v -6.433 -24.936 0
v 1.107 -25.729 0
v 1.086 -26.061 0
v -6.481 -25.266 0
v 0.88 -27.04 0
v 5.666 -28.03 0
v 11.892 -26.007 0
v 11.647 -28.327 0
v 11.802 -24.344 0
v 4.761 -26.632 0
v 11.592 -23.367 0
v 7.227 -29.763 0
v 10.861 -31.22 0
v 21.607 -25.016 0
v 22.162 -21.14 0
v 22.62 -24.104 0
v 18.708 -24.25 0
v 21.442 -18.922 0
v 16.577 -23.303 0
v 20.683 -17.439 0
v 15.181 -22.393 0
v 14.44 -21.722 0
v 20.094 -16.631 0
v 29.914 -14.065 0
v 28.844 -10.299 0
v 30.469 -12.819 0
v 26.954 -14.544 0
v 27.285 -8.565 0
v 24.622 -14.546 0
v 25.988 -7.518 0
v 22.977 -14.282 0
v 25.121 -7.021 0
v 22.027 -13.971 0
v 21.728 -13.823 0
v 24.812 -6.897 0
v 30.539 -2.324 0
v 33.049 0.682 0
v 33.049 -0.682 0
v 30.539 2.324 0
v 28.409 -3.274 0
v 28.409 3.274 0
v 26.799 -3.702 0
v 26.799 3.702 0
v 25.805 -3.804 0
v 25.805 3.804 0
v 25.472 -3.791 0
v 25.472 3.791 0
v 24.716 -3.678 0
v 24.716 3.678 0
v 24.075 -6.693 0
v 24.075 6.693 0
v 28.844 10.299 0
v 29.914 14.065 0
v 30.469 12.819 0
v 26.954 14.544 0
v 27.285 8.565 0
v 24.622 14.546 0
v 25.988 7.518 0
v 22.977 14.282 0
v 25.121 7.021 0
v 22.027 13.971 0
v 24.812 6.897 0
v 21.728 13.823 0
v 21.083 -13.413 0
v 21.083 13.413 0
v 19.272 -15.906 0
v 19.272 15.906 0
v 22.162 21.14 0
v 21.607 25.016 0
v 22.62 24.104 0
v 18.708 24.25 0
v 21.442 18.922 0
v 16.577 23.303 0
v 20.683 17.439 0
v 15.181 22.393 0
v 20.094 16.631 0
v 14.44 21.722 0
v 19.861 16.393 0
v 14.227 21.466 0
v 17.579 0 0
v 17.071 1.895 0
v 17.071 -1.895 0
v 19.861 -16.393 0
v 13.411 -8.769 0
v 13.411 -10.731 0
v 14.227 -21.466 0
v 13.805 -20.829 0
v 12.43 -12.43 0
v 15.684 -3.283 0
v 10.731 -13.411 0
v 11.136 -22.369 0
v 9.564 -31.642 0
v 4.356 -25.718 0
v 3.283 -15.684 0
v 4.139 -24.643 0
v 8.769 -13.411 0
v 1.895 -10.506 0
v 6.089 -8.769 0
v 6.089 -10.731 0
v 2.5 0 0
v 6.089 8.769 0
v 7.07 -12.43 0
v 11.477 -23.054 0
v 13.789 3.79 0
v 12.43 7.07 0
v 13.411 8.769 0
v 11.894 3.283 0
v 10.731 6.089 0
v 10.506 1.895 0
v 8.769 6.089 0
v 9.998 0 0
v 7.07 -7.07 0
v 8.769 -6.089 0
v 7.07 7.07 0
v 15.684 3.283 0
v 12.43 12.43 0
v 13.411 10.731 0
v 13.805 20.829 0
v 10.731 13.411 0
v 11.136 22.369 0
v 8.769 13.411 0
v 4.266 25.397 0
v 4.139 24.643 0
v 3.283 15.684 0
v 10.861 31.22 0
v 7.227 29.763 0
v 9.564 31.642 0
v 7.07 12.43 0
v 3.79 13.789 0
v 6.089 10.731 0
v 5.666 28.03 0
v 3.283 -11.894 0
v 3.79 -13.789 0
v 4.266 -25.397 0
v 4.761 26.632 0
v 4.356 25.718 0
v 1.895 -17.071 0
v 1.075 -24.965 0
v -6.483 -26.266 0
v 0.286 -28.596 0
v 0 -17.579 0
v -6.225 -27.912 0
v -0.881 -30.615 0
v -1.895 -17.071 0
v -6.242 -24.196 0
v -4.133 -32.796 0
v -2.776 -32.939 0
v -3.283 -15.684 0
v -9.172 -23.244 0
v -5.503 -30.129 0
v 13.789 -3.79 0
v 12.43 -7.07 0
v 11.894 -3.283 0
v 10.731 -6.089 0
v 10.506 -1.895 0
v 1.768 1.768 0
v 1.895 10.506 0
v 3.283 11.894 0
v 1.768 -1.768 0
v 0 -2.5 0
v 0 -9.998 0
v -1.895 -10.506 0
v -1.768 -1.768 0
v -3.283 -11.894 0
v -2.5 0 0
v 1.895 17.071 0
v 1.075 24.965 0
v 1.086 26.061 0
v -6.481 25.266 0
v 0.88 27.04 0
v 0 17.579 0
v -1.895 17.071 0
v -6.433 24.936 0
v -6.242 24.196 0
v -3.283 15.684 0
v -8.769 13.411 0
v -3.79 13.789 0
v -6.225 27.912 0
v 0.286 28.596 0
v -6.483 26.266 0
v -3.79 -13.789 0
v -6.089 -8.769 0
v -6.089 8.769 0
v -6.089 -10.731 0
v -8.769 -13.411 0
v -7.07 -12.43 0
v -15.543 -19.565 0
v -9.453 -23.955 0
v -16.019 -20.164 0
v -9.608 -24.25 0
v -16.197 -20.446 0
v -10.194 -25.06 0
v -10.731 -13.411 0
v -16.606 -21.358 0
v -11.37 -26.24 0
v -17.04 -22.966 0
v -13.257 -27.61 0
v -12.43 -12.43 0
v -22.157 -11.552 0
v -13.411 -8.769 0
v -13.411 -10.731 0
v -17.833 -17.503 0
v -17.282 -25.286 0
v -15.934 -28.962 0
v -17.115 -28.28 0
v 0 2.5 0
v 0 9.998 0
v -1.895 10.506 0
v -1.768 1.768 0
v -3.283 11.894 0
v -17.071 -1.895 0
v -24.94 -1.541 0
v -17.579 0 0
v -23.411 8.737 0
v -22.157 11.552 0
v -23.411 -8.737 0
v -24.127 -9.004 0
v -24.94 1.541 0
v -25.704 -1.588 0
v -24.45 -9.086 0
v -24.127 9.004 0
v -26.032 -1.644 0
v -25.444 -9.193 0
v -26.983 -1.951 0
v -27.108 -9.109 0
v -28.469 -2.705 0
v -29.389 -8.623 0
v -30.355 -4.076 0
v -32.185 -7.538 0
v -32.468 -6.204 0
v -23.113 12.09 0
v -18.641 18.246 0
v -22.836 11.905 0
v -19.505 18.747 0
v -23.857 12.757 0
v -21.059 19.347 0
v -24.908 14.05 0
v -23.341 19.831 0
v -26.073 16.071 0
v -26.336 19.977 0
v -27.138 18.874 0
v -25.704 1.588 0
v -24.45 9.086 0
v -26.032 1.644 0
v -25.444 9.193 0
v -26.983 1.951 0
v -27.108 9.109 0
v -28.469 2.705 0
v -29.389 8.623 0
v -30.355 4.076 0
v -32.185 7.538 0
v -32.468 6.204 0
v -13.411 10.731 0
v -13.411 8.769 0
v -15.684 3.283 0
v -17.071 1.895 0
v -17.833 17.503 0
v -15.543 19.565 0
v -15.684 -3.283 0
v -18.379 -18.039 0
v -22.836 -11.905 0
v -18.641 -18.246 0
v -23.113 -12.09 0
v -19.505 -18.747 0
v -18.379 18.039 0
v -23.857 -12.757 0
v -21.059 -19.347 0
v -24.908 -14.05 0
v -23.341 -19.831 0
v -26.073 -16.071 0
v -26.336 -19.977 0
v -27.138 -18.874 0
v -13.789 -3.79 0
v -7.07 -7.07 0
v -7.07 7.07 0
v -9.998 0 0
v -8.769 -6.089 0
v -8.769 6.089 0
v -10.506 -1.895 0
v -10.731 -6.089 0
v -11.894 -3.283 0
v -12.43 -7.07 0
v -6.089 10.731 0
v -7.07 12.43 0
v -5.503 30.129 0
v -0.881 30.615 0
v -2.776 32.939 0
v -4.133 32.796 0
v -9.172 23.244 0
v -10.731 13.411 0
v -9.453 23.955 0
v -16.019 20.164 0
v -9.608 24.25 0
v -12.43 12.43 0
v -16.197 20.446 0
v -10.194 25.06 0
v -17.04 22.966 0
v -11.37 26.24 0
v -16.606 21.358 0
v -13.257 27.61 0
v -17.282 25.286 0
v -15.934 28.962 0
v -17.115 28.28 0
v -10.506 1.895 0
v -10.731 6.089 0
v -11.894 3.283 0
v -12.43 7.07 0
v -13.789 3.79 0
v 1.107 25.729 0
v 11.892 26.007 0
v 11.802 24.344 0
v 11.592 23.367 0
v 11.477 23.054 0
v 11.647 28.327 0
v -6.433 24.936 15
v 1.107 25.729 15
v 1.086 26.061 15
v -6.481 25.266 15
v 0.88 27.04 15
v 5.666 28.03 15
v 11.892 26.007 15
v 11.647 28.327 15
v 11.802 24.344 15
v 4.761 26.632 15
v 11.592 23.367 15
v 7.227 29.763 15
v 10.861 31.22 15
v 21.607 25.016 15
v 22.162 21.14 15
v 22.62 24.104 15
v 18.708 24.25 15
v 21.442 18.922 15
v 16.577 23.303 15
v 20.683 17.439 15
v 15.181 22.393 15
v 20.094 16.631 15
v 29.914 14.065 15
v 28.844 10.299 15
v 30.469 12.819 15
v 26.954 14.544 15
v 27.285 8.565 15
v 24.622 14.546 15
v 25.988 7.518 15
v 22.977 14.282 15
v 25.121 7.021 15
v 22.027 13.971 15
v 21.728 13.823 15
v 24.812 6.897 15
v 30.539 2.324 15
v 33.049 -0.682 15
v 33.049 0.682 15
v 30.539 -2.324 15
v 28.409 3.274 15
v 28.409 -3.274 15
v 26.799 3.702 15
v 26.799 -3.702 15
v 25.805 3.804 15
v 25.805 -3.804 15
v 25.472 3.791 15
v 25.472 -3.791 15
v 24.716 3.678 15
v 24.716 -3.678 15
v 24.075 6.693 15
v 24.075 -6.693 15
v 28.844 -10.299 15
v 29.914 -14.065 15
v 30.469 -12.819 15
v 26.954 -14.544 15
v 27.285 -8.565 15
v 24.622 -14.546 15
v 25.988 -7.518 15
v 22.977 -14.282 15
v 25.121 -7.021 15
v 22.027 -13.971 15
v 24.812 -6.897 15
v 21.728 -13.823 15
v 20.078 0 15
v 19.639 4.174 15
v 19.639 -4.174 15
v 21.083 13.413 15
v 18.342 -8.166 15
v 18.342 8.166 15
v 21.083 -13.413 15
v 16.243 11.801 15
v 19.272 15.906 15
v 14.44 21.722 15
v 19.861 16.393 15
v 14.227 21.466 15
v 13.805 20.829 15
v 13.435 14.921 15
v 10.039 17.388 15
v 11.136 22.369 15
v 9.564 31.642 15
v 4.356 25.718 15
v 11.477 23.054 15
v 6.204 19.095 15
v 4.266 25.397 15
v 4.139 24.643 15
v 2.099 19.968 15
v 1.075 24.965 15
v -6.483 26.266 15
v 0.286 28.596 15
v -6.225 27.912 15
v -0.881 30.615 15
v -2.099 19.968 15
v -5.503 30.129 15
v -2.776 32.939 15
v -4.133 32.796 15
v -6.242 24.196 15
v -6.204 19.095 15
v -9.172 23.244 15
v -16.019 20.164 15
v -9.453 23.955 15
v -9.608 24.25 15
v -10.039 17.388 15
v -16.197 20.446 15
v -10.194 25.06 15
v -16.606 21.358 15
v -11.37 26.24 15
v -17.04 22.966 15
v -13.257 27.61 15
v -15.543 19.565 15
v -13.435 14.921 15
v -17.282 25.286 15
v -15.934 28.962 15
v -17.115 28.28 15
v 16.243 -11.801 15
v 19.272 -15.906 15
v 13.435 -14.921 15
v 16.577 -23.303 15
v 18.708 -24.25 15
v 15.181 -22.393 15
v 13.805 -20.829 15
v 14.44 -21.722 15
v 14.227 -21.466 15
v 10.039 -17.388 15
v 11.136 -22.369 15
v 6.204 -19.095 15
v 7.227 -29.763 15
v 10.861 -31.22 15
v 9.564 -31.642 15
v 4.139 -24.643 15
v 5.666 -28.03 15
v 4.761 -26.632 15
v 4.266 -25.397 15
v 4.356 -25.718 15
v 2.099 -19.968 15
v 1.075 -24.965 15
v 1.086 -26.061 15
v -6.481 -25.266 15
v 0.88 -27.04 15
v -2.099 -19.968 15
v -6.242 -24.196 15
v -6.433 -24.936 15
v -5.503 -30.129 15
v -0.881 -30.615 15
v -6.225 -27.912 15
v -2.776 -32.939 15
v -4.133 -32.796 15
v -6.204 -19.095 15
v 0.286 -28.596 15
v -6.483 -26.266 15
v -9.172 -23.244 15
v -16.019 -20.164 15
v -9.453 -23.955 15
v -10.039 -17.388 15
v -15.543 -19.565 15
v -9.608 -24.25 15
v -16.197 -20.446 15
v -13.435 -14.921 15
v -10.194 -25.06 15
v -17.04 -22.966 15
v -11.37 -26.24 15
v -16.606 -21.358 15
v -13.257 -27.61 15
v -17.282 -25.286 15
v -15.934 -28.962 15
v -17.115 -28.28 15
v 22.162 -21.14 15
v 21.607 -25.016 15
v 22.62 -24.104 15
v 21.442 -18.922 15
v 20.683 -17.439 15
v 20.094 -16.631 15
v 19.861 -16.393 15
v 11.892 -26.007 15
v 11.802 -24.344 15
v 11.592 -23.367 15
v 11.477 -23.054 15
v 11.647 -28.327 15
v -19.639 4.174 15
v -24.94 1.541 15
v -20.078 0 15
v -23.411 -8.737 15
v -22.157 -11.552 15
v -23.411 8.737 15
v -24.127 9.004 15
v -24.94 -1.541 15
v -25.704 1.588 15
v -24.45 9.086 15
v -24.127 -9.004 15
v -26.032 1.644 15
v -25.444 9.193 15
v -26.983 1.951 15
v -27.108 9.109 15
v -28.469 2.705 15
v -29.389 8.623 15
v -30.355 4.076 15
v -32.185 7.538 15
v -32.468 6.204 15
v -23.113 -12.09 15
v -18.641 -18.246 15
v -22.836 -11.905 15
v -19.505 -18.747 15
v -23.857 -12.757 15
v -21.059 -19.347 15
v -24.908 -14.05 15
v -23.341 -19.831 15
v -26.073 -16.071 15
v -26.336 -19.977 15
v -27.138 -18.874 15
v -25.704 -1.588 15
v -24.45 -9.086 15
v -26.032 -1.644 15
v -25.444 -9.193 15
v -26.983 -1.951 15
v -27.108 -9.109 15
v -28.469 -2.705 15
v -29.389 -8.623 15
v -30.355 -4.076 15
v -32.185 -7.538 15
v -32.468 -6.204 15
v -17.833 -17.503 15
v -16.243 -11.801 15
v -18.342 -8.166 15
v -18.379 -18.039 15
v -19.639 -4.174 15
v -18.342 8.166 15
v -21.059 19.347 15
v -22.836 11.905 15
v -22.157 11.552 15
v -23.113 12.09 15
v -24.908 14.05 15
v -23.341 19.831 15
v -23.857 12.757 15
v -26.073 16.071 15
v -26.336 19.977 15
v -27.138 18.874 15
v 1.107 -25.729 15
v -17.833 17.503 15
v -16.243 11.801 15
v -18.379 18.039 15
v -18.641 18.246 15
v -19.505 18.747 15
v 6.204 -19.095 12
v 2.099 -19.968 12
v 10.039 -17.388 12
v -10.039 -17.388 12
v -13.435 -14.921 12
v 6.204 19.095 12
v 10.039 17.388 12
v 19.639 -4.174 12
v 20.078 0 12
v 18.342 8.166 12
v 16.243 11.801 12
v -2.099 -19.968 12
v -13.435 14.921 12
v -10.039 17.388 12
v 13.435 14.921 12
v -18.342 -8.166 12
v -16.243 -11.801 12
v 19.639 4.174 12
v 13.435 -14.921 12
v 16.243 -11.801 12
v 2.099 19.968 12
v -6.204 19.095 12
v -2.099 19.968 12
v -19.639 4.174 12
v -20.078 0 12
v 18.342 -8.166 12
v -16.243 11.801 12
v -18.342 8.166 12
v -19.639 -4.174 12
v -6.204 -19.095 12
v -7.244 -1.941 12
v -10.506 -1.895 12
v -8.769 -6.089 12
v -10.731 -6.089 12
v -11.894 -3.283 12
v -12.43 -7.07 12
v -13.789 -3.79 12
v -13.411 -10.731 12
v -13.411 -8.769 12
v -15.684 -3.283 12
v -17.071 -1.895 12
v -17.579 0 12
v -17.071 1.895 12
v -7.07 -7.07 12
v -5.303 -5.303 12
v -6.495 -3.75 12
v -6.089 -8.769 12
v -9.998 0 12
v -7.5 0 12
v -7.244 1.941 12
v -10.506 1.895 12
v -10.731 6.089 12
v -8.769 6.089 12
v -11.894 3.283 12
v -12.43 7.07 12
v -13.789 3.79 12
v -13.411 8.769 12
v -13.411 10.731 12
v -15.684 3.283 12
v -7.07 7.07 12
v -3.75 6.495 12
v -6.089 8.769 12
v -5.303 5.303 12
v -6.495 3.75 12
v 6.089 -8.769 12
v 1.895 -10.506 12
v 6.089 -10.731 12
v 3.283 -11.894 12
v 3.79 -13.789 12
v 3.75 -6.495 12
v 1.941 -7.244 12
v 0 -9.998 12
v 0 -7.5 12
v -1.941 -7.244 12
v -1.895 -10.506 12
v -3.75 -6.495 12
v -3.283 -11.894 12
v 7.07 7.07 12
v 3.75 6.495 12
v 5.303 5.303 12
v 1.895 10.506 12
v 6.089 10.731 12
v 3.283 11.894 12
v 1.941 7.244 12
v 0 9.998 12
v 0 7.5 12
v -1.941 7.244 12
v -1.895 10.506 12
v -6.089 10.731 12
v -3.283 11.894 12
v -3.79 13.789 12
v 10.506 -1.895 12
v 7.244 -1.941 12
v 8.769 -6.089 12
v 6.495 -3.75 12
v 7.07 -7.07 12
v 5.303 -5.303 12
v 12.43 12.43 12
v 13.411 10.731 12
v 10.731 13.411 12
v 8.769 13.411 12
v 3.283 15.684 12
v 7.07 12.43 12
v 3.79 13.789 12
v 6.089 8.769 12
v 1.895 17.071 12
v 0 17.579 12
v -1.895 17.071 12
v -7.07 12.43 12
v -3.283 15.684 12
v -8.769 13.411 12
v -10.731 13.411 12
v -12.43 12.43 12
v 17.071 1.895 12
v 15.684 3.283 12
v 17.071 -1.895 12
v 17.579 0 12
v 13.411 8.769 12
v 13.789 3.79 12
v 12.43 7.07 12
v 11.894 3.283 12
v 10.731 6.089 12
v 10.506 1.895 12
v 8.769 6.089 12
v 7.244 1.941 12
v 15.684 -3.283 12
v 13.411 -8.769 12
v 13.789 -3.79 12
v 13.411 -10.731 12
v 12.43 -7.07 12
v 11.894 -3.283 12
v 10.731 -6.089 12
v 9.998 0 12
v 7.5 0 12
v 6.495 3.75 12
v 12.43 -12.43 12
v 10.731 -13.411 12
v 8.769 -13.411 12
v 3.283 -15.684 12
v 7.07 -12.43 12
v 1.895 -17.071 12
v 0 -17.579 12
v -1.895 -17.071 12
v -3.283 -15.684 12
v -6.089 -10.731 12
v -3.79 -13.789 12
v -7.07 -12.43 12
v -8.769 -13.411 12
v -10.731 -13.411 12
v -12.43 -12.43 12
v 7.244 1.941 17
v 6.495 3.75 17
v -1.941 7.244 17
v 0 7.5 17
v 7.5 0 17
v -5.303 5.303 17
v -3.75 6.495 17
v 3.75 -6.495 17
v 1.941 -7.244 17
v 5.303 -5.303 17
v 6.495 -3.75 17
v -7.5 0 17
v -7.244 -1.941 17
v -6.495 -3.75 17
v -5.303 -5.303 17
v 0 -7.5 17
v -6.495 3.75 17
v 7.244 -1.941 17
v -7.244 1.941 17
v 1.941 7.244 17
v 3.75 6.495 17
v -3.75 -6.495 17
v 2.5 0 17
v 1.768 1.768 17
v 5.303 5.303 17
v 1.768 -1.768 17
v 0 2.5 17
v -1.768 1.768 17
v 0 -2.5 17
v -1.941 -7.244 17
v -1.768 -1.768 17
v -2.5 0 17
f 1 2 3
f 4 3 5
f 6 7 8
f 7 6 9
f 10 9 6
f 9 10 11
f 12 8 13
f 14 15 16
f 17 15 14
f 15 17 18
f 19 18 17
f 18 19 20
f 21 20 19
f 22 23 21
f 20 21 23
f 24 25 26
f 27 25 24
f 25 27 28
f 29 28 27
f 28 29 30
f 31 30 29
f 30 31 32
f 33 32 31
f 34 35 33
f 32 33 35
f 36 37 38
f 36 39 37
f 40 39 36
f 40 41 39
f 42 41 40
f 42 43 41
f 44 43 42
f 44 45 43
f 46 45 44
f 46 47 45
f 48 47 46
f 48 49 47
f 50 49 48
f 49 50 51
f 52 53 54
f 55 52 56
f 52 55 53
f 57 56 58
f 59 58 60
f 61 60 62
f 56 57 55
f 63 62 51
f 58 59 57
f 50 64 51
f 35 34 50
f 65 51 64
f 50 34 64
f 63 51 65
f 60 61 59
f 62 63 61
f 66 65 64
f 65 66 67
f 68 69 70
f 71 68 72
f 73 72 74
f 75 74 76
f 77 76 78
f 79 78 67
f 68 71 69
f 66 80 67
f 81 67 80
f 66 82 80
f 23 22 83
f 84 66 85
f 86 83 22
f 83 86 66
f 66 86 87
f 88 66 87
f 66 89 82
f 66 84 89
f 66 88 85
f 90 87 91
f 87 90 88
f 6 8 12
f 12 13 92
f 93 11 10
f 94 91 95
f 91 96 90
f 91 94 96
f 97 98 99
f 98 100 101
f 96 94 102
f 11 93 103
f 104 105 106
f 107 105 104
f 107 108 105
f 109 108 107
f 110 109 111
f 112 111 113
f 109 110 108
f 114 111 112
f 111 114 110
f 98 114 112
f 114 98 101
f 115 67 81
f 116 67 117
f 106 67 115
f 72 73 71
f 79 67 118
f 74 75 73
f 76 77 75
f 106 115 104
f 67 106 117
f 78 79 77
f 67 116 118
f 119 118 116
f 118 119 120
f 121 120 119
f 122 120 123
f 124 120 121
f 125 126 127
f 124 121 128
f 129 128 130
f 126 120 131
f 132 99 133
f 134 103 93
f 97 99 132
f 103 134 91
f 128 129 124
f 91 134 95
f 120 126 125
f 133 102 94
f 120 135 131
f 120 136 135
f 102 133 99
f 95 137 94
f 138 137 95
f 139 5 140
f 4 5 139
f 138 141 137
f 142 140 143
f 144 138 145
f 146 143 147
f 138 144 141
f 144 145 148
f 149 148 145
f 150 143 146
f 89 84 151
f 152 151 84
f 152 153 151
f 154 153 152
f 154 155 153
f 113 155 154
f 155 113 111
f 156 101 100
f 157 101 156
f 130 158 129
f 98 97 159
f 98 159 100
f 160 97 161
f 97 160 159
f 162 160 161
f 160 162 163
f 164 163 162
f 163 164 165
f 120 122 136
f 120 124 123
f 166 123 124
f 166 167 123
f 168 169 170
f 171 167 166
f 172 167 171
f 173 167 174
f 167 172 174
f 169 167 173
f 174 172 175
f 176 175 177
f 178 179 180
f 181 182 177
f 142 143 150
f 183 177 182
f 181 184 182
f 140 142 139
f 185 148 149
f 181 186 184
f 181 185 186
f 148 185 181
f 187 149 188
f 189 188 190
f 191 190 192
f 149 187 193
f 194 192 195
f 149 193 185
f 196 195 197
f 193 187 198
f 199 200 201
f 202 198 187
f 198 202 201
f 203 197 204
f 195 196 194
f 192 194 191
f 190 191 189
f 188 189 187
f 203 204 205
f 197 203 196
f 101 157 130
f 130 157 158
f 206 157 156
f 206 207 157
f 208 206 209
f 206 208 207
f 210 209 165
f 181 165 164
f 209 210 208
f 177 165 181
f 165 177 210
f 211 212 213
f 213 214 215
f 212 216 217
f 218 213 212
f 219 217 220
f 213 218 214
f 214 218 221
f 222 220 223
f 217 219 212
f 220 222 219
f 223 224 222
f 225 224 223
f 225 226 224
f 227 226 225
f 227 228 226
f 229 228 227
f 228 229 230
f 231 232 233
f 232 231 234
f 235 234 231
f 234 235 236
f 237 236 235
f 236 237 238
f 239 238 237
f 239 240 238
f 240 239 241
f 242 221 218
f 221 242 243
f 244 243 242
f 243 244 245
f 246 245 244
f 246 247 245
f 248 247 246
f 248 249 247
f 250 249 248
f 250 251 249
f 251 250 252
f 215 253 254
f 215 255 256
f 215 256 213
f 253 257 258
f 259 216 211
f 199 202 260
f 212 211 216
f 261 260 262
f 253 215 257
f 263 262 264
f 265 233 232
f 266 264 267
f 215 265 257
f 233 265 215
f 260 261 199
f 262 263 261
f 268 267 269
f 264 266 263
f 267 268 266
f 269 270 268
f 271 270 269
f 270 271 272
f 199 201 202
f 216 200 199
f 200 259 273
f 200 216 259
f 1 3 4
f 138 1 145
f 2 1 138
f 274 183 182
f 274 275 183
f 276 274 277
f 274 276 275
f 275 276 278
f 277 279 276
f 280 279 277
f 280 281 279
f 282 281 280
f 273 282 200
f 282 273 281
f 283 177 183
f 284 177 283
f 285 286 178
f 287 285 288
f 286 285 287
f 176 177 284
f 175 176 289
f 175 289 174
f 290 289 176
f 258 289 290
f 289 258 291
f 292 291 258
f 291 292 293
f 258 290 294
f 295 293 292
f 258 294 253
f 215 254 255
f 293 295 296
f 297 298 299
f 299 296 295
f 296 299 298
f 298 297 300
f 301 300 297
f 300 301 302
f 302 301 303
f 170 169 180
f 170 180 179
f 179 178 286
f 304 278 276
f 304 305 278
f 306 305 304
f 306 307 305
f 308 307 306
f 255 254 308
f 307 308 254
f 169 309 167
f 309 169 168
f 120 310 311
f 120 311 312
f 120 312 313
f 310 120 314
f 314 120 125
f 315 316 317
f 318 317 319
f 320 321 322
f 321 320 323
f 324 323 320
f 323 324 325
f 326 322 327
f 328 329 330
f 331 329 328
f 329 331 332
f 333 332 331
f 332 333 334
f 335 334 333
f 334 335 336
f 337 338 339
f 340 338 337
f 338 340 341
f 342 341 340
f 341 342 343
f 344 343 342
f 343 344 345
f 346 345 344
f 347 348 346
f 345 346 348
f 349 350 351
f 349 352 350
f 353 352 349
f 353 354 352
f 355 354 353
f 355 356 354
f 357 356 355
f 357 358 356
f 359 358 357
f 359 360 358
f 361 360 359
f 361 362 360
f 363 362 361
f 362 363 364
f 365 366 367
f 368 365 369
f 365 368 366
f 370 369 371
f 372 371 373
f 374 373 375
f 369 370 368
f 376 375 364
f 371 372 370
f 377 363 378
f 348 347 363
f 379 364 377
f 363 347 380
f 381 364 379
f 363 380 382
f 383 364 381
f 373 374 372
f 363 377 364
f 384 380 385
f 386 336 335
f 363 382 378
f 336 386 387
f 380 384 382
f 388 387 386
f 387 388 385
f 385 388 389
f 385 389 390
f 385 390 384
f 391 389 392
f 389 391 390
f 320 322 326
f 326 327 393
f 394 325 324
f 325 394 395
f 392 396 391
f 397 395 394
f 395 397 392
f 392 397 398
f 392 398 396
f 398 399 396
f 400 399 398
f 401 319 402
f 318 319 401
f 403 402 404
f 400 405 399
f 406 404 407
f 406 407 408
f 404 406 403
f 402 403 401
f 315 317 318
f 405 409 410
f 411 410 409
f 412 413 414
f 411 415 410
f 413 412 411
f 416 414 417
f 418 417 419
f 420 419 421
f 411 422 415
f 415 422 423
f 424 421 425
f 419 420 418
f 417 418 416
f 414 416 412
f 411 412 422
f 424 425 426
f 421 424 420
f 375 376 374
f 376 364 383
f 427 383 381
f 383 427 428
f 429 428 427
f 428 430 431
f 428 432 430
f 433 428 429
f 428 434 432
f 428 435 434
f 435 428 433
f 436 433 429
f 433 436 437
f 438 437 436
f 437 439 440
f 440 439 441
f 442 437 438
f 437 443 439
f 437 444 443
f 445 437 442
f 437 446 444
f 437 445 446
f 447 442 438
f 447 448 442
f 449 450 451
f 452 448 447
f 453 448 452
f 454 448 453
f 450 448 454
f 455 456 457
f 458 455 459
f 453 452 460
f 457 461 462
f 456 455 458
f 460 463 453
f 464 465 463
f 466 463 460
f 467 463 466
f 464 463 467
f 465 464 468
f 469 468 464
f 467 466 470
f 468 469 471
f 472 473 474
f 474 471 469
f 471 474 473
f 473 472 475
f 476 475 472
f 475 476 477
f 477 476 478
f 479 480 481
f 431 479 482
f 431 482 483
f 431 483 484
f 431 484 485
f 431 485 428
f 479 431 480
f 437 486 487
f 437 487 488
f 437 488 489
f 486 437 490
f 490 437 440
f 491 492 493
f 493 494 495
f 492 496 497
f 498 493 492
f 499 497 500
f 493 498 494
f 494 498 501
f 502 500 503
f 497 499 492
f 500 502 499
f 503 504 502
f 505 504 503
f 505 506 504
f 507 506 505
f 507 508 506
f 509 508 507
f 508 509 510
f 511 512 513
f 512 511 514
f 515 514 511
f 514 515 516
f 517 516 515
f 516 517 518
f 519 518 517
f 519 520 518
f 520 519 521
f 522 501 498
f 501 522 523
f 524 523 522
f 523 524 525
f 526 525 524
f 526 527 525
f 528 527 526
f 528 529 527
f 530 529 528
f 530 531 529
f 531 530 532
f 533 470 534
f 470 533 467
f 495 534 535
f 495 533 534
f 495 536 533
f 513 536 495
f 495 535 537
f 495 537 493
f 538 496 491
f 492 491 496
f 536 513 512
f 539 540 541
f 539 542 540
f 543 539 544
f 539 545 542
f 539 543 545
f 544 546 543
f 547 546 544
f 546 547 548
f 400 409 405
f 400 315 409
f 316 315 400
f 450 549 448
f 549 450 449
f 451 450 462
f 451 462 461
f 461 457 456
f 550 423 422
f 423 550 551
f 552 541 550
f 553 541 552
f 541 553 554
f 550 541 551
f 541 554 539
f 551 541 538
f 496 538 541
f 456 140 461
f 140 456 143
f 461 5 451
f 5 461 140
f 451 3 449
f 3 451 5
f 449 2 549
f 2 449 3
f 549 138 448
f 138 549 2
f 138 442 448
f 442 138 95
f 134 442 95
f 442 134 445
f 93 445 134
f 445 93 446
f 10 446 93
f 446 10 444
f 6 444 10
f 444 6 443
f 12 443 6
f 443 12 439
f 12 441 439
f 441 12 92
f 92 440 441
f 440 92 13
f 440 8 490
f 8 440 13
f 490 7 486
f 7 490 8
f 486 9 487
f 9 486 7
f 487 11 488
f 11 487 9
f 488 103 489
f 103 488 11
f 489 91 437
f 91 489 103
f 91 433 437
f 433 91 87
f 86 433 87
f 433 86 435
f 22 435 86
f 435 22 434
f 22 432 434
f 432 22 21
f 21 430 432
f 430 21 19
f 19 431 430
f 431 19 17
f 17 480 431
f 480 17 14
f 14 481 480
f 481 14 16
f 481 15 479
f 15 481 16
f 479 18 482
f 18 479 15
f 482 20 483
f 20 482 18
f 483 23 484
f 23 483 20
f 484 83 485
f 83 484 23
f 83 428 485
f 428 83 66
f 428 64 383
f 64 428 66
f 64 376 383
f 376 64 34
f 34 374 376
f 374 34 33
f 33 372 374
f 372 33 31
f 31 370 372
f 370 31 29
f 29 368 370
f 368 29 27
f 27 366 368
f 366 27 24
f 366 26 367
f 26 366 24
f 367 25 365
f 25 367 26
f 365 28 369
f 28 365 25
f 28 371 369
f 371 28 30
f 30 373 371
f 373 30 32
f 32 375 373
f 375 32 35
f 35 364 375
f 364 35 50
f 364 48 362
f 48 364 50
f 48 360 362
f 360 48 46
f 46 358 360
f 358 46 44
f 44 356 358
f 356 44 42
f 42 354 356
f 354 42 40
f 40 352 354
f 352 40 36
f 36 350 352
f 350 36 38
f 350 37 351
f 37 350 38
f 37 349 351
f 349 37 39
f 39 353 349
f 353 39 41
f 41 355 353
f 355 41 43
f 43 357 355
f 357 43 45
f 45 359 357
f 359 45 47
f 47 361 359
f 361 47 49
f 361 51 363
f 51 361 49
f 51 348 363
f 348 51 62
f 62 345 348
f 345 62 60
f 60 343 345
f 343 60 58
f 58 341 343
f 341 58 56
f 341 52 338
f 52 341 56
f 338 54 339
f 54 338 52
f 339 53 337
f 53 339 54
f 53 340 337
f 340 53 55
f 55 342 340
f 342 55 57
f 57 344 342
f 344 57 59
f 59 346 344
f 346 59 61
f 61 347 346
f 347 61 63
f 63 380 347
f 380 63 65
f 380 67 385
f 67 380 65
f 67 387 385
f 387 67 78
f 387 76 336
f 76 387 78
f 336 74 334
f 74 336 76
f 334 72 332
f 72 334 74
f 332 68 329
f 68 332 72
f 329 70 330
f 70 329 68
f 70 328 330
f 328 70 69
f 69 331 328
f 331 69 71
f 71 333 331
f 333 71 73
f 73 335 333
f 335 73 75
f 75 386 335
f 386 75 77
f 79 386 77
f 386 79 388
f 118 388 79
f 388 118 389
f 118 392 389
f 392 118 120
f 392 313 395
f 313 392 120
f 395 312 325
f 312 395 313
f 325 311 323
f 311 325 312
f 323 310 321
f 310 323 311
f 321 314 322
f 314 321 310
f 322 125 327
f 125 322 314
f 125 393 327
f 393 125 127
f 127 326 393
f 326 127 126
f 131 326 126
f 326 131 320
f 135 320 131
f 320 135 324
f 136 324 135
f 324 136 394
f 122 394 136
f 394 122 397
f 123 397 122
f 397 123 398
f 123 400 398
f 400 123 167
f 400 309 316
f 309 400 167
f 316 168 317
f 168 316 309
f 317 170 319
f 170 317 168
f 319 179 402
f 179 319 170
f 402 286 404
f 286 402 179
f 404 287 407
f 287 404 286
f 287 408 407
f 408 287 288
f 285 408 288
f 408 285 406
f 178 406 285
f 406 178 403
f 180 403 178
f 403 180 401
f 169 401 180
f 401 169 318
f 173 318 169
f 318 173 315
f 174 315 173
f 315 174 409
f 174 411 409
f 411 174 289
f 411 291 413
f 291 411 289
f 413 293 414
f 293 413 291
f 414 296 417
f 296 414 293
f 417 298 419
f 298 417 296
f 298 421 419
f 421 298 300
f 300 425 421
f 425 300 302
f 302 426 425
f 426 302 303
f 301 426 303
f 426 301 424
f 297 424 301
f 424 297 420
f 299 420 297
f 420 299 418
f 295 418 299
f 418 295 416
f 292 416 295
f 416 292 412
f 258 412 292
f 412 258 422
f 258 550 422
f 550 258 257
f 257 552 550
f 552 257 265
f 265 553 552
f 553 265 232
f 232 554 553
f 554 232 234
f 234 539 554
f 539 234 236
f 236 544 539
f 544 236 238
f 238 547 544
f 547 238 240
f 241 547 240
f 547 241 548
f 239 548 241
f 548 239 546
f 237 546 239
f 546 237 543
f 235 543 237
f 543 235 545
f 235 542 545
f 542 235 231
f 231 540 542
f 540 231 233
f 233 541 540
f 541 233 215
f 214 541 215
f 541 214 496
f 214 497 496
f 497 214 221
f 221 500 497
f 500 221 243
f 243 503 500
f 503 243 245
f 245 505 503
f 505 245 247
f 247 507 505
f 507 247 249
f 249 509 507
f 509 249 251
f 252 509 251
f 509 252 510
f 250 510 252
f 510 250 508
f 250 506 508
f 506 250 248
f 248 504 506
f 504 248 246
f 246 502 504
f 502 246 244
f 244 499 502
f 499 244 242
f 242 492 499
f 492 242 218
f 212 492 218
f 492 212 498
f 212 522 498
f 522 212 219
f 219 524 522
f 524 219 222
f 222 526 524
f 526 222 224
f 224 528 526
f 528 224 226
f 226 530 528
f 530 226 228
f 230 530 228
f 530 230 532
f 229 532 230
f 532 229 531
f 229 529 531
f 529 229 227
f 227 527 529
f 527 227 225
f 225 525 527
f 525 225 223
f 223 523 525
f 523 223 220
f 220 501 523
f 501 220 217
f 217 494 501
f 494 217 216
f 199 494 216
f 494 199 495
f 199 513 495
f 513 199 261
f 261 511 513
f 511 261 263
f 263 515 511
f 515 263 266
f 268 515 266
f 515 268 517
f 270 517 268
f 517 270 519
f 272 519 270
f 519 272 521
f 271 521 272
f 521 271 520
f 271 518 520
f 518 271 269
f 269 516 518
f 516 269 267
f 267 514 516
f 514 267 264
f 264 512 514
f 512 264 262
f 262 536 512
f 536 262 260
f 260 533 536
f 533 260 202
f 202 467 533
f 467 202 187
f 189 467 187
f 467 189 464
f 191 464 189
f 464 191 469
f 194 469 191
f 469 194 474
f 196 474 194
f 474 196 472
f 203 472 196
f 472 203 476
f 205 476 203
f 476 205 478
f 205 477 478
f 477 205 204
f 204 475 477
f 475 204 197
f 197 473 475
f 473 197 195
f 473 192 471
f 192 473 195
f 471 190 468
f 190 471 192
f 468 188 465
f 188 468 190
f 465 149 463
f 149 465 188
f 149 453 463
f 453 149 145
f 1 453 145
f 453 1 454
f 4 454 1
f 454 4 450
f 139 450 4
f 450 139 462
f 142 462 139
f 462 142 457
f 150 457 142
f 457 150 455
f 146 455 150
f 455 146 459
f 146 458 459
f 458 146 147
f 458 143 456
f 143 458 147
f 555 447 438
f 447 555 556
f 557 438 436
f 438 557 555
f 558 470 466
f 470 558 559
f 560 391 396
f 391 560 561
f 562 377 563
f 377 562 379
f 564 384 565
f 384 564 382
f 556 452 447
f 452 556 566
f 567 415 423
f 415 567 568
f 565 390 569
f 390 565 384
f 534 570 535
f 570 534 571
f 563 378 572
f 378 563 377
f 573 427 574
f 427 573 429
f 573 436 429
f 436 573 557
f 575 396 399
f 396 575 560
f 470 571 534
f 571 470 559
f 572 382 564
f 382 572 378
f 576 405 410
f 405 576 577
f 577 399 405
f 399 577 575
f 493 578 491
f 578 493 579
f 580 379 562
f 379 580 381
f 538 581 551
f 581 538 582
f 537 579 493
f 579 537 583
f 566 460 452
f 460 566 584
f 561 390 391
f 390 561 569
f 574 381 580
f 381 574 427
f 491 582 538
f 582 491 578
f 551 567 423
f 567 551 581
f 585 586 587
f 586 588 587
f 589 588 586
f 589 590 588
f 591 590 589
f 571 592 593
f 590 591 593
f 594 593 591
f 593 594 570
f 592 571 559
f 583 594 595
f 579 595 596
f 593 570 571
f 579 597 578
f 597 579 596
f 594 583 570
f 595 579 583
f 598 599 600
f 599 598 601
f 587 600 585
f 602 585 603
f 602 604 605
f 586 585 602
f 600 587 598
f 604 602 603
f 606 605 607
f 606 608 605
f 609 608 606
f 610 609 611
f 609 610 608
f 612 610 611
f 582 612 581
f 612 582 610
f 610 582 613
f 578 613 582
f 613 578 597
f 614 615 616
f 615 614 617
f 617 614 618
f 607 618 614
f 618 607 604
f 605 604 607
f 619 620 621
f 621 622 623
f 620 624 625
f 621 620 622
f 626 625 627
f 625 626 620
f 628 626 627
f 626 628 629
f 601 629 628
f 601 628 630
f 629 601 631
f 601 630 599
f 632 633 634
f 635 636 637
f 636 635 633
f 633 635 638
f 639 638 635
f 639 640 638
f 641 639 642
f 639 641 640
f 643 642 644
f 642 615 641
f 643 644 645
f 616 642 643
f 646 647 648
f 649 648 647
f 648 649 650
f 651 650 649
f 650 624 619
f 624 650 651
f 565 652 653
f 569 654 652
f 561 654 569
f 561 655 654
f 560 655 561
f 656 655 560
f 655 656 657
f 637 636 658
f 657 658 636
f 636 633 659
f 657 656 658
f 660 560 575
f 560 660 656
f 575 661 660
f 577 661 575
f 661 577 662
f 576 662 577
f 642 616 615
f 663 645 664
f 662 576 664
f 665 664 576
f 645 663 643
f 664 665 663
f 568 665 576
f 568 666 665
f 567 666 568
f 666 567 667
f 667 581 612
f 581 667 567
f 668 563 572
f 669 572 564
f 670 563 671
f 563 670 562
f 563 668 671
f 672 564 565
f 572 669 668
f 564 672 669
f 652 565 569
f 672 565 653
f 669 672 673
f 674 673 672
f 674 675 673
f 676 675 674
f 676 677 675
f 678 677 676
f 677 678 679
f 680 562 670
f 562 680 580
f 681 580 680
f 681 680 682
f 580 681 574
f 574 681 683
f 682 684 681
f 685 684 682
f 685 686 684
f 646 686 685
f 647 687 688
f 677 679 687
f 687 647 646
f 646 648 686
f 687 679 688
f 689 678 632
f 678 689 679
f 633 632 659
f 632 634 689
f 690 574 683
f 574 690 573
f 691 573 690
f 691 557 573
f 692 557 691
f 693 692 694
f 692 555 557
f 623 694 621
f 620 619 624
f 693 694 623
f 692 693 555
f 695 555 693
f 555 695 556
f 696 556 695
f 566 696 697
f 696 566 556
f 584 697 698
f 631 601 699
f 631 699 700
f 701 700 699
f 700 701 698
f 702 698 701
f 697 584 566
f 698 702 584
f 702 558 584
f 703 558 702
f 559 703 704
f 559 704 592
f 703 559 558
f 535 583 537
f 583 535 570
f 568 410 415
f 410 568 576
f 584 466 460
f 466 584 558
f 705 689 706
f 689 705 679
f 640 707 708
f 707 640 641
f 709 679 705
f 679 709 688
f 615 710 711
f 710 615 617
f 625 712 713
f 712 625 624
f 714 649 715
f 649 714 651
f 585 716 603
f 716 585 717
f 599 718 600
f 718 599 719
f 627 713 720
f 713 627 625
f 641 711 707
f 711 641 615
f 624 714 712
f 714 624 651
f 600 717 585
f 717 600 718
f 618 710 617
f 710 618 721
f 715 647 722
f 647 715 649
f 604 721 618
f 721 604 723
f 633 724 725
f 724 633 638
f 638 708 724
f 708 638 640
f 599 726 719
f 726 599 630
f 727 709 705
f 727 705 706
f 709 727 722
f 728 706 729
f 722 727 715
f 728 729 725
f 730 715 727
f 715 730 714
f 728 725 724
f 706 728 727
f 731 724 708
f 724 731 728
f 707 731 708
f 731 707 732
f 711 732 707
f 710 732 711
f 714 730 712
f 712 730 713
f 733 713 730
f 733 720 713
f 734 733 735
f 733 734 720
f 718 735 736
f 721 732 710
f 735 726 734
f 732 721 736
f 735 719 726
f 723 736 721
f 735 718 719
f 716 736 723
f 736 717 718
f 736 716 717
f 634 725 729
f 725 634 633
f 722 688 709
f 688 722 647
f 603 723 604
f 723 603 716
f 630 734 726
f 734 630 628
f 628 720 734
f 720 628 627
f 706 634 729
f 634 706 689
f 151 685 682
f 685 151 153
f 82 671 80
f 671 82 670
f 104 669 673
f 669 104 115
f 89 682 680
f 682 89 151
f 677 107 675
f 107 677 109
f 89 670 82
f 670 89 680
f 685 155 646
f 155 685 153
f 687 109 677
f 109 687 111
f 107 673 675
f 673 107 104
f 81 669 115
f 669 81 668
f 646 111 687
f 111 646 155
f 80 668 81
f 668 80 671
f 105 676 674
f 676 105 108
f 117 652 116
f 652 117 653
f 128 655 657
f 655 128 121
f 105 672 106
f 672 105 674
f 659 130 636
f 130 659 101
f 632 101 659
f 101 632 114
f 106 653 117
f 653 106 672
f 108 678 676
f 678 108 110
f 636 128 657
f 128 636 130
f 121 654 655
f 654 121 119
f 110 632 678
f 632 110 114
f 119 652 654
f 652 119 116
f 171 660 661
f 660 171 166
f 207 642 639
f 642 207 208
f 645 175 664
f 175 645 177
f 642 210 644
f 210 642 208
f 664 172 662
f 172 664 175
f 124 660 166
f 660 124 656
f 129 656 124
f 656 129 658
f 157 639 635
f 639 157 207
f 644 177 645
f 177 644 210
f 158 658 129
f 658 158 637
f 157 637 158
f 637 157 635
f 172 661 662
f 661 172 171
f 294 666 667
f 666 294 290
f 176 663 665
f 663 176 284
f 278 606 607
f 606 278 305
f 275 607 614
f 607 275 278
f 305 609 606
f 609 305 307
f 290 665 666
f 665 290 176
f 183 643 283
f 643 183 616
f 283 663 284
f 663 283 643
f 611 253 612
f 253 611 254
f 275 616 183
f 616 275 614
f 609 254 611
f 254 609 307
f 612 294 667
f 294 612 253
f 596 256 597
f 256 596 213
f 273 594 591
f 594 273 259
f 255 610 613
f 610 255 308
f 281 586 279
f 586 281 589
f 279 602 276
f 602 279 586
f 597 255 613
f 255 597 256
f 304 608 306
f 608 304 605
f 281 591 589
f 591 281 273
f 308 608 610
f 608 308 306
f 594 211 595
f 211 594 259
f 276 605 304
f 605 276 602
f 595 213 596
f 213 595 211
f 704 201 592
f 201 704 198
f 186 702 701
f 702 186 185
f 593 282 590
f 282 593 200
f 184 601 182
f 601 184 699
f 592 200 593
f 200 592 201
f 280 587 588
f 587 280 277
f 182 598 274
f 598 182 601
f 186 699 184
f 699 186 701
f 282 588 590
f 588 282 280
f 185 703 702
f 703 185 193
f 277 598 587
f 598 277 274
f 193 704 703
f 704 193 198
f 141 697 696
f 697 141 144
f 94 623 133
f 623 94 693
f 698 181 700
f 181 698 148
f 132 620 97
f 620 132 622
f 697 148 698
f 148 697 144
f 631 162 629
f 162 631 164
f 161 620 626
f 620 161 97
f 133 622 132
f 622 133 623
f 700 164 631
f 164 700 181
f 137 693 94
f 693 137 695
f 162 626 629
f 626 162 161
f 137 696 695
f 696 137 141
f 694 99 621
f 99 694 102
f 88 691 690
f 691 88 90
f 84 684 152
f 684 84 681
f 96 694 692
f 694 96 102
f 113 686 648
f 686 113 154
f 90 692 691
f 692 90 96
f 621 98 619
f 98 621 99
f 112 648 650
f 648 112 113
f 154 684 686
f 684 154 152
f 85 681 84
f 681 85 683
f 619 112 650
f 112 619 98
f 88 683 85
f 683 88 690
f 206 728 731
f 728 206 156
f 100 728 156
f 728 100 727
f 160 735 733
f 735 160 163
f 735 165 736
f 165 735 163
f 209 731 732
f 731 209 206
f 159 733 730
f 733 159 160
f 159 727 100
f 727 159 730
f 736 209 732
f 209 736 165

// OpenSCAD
// Parametric Involute Bevel and Spur Gears by GregFrost
// It is licensed under the Creative Commons - GNU LGPL 2.1 license.
// © 2010 by GregFrost, thingiverse.com/Amp
// http://www.thingiverse.com/thing:3575 and http://www.thingiverse.com/thing:3752

// Simple Test:
gear (circular_pitch=700,
	gear_thickness = 12,
	rim_thickness = 15,
	hub_thickness = 17,
	circles=8);

//Complex Spur Gear Test:
//test_gears ();

// Meshing Double Helix:
//test_meshing_double_helix ();

module test_meshing_double_helix(){
    meshing_double_helix ();
}

// Demonstrate the backlash option for Spur gears.
//test_backlash ();

// Demonstrate how to make meshing bevel gears.
//test_bevel_gear_pair();

module test_bevel_gear_pair(){
    bevel_gear_pair ();
}

module test_bevel_gear(){bevel_gear();}

//bevel_gear();

pi=3.1415926535897932384626433832795;

//==================================================
// Bevel Gears:
// Two gears with the same cone distance, circular pitch (measured at the cone distance)
// and pressure angle will mesh.

module bevel_gear_pair (
	gear1_teeth = 41,
	gear2_teeth = 7,
	axis_angle = 90,
	outside_circular_pitch=1000)
{
	outside_pitch_radius1 = gear1_teeth * outside_circular_pitch / 360;
	outside_pitch_radius2 = gear2_teeth * outside_circular_pitch / 360;
	pitch_apex1=outside_pitch_radius2 * sin (axis_angle) +
		(outside_pitch_radius2 * cos (axis_angle) + outside_pitch_radius1) / tan (axis_angle);
	cone_distance = sqrt (pow (pitch_apex1, 2) + pow (outside_pitch_radius1, 2));
	pitch_apex2 = sqrt (pow (cone_distance, 2) - pow (outside_pitch_radius2, 2));
	echo ("cone_distance", cone_distance);
	pitch_angle1 = asin (outside_pitch_radius1 / cone_distance);
	pitch_angle2 = asin (outside_pitch_radius2 / cone_distance);
	echo ("pitch_angle1, pitch_angle2", pitch_angle1, pitch_angle2);
	echo ("pitch_angle1 + pitch_angle2", pitch_angle1 + pitch_angle2);

	rotate([0,0,90])
	translate ([0,0,pitch_apex1+20])
	{
		translate([0,0,-pitch_apex1])
		bevel_gear (
			number_of_teeth=gear1_teeth,
			cone_distance=cone_distance,
			pressure_angle=30,
			outside_circular_pitch=outside_circular_pitch);

		rotate([0,-(pitch_angle1+pitch_angle2),0])
		translate([0,0,-pitch_apex2])
		bevel_gear (
			number_of_teeth=gear2_teeth,
			cone_distance=cone_distance,
			pressure_angle=30,
			outside_circular_pitch=outside_circular_pitch);
	}
}

//Bevel Gear Finishing Options:
bevel_gear_flat = 0;
bevel_gear_back_cone = 1;

module bevel_gear (
	number_of_teeth=11,
	cone_distance=100,
	face_width=20,
	outside_circular_pitch=1000,
	pressure_angle=30,
	clearance = 0.2,
	bore_diameter=5,
	gear_thickness = 15,
	backlash = 0,
	involute_facets=0,
	finish = -1)
{
	echo ("bevel_gear",
		"teeth", number_of_teeth,
		"cone distance", cone_distance,
		face_width,
		outside_circular_pitch,
		pressure_angle,
		clearance,
		bore_diameter,
		involute_facets,
		finish);

	// Pitch diameter: Diameter of pitch circle at the fat end of the gear.
	outside_pitch_diameter  =  number_of_teeth * outside_circular_pitch / 180;
	outside_pitch_radius = outside_pitch_diameter / 2;

	// The height of the pitch apex.
	pitch_apex = sqrt (pow (cone_distance, 2) - pow (outside_pitch_radius, 2));
	pitch_angle = asin (outside_pitch_radius/cone_distance);

	echo ("Num Teeth:", number_of_teeth, " Pitch Angle:", pitch_angle);

	finish = (finish != -1) ? finish : (pitch_angle < 45) ? bevel_gear_flat : bevel_gear_back_cone;

	apex_to_apex=cone_distance / cos (pitch_angle);
	back_cone_radius = apex_to_apex * sin (pitch_angle);

	// Calculate and display the pitch angle. This is needed to determine the angle to mount two meshing cone gears.

	// Base Circle for forming the involute teeth shape.
	base_radius = back_cone_radius * cos (pressure_angle);

	// Diametrial pitch: Number of teeth per unit length.
	pitch_diametrial = number_of_teeth / outside_pitch_diameter;

	// Addendum: Radial distance from pitch circle to outside circle.
	addendum = 1 / pitch_diametrial;
	// Outer Circle
	outer_radius = back_cone_radius + addendum;

	// Dedendum: Radial distance from pitch circle to root diameter
	dedendum = addendum + clearance;
	dedendum_angle = atan (dedendum / cone_distance);
	root_angle = pitch_angle - dedendum_angle;

	root_cone_full_radius = tan (root_angle)*apex_to_apex;
	back_cone_full_radius=apex_to_apex / tan (pitch_angle);

	back_cone_end_radius =
		outside_pitch_radius -
		dedendum * cos (pitch_angle) -
		gear_thickness / tan (pitch_angle);
	back_cone_descent = dedendum * sin (pitch_angle) + gear_thickness;

	// Root diameter: Diameter of bottom of tooth spaces.
	root_radius = back_cone_radius - dedendum;

	half_tooth_thickness = outside_pitch_radius * sin (360 / (4 * number_of_teeth)) - backlash / 4;
	half_thick_angle = asin (half_tooth_thickness / back_cone_radius);

	face_cone_height = apex_to_apex-face_width / cos (pitch_angle);
	face_cone_full_radius = face_cone_height / tan (pitch_angle);
	face_cone_descent = dedendum * sin (pitch_angle);
	face_cone_end_radius =
		outside_pitch_radius -
		face_width / sin (pitch_angle) -
		face_cone_descent / tan (pitch_angle);

	// For the bevel_gear_flat finish option, calculate the height of a cube to select the portion of the gear that includes the full pitch face.
	bevel_gear_flat_height = pitch_apex - (cone_distance - face_width) * cos (pitch_angle);

//	translate([0,0,-pitch_apex])
	difference ()
	{
		intersection ()
		{
			union()
			{
				rotate (half_thick_angle)
				translate ([0,0,pitch_apex-apex_to_apex])
				cylinder ($fn=number_of_teeth*2, r1=root_cone_full_radius,r2=0,h=apex_to_apex);
				for (i = [1:number_of_teeth])
//				for (i = [1:1])
				{
					rotate ([0,0,i*360/number_of_teeth])
					{
						involute_bevel_gear_tooth (
							back_cone_radius = back_cone_radius,
							root_radius = root_radius,
							base_radius = base_radius,
							outer_radius = outer_radius,
							pitch_apex = pitch_apex,
							cone_distance = cone_distance,
							half_thick_angle = half_thick_angle,
							involute_facets = involute_facets);
					}
				}
			}

			if (finish == bevel_gear_back_cone)
			{
				translate ([0,0,-back_cone_descent])
				cylinder (
					$fn=number_of_teeth*2,
					r1=back_cone_end_radius,
					r2=back_cone_full_radius*2,
					h=apex_to_apex + back_cone_descent);
			}
			else
			{
				translate ([-1.5*outside_pitch_radius,-1.5*outside_pitch_radius,0])
				cube ([3*outside_pitch_radius,
					3*outside_pitch_radius,
					bevel_gear_flat_height]);
			}
		}

		if (finish == bevel_gear_back_cone)
		{
			translate ([0,0,-face_cone_descent])
			cylinder (
				r1=face_cone_end_radius,
				r2=face_cone_full_radius * 2,
				h=face_cone_height + face_cone_descent+pitch_apex);
		}

		translate ([0,0,pitch_apex - apex_to_apex])
		cylinder (r=bore_diameter/2,h=apex_to_apex);
	}
}

module involute_bevel_gear_tooth (
	back_cone_radius,
	root_radius,
	base_radius,
	outer_radius,
	pitch_apex,
	cone_distance,
	half_thick_angle,
	involute_facets)
{
//	echo ("involute_bevel_gear_tooth",
//		back_cone_radius,
//		root_radius,
//		base_radius,
//		outer_radius,
//		pitch_apex,
//		cone_distance,
//		half_thick_angle);

	min_radius = max (base_radius*2,root_radius*2);

	pitch_point =
		involute (
			base_radius*2,
			involute_intersect_angle (base_radius*2, back_cone_radius*2));
	pitch_angle = atan2 (pitch_point[1], pitch_point[0]);
	centre_angle = pitch_angle + half_thick_angle;

	start_angle = involute_intersect_angle (base_radius*2, min_radius);
	stop_angle = involute_intersect_angle (base_radius*2, outer_radius*2);

	res=(involute_facets!=0)?involute_facets:($fn==0)?5:$fn/4;

	translate ([0,0,pitch_apex])
	rotate ([0,-atan(back_cone_radius/cone_distance),0])
	translate ([-back_cone_radius*2,0,-cone_distance*2])
	union ()
	{
		for (i=[1:res])
		{
			assign (
				point1=
					involute (base_radius*2,start_angle+(stop_angle - start_angle)*(i-1)/res),
				point2=
					involute (base_radius*2,start_angle+(stop_angle - start_angle)*(i)/res))
			{
				assign (
					side1_point1 = rotate_point (centre_angle, point1),
					side1_point2 = rotate_point (centre_angle, point2),
					side2_point1 = mirror_point (rotate_point (centre_angle, point1)),
					side2_point2 = mirror_point (rotate_point (centre_angle, point2)))
				{
					polyhedron (
						points=[
							[back_cone_radius*2+0.1,0,cone_distance*2],
							[side1_point1[0],side1_point1[1],0],
							[side1_point2[0],side1_point2[1],0],
							[side2_point2[0],side2_point2[1],0],
							[side2_point1[0],side2_point1[1],0],
							[0.1,0,0]],
						triangles=[[0,2,1],[0,3,2],[0,4,3],[0,1,5],[1,2,5],[2,3,5],[3,4,5],[0,5,4]]);
				}
			}
		}
	}
}

module gear (
	number_of_teeth=15,
	circular_pitch=false, diametral_pitch=false,
	pressure_angle=28,
	clearance = 0.2,
	gear_thickness=5,
	rim_thickness=8,
	rim_width=5,
	hub_thickness=10,
	hub_diameter=15,
	bore_diameter=5,
	circles=0,
	backlash=0,
	twist=0,
	involute_facets=0,
	flat=false)
{
	if (circular_pitch==false && diametral_pitch==false)
		echo("MCAD ERROR: gear module needs either a diametral_pitch or circular_pitch");

	//Convert diametrial pitch to our native circular pitch
	circular_pitch = (circular_pitch!=false?circular_pitch:180/diametral_pitch);

	// Pitch diameter: Diameter of pitch circle.
	pitch_diameter  =  number_of_teeth * circular_pitch / 180;
	pitch_radius = pitch_diameter/2;
	echo ("Teeth:", number_of_teeth, " Pitch radius:", pitch_radius);

	// Base Circle
	base_radius = pitch_radius*cos(pressure_angle);

	// Diametrial pitch: Number of teeth per unit length.
	pitch_diametrial = number_of_teeth / pitch_diameter;

	// Addendum: Radial distance from pitch circle to outside circle.
	addendum = 1/pitch_diametrial;

	//Outer Circle
	outer_radius = pitch_radius+addendum;

	// Dedendum: Radial distance from pitch circle to root diameter
	dedendum = addendum + clearance;

	// Root diameter: Diameter of bottom of tooth spaces.
	root_radius = pitch_radius-dedendum;
	backlash_angle = backlash / pitch_radius * 180 / pi;
	half_thick_angle = (360 / number_of_teeth - backlash_angle) / 4;

	// Variables controlling the rim.
	rim_radius = root_radius - rim_width;

	// Variables controlling the circular holes in the gear.
	circle_orbit_diameter=hub_diameter/2+rim_radius;
	circle_orbit_curcumference=pi*circle_orbit_diameter;

	// Limit the circle size to 90% of the gear face.
	circle_diameter=
		min (
			0.70*circle_orbit_curcumference/circles,
			(rim_radius-hub_diameter/2)*0.9);

	difference()
	{
		union ()
		{
			difference ()
			{
				linear_exturde_flat_option(flat=flat, height=rim_thickness, convexity=10, twist=twist)
				gear_shape (
					number_of_teeth,
					pitch_radius = pitch_radius,
					root_radius = root_radius,
					base_radius = base_radius,
					outer_radius = outer_radius,
					half_thick_angle = half_thick_angle,
					involute_facets=involute_facets);

				if (gear_thickness < rim_thickness)
					translate ([0,0,gear_thickness])
					cylinder (r=rim_radius,h=rim_thickness-gear_thickness+1);
			}
			if (gear_thickness > rim_thickness)
				linear_exturde_flat_option(flat=flat, height=gear_thickness)
				circle (r=rim_radius);
			if (flat == false && hub_thickness > gear_thickness)
				translate ([0,0,gear_thickness])
				linear_exturde_flat_option(flat=flat, height=hub_thickness-gear_thickness)
				circle (r=hub_diameter/2);
		}
		translate ([0,0,-1])
		linear_exturde_flat_option(flat =flat, height=2+max(rim_thickness,hub_thickness,gear_thickness))
		circle (r=bore_diameter/2);
		if (circles>0)
		{
			for(i=[0:circles-1])
				rotate([0,0,i*360/circles])
				translate([circle_orbit_diameter/2,0,-1])
				linear_exturde_flat_option(flat =flat, height=max(gear_thickness,rim_thickness)+3)
				circle(r=circle_diameter/2);
		}
	}
}

module linear_exturde_flat_option(flat =false, height = 10, center = false, convexity = 2, twist = 0)
{
	if(flat==false)
	{
		linear_extrude(height = height, center = center, convexity = convexity, twist= twist) child(0);
	}
	else
	{
		child(0);
	}

}

module gear_shape (
	number_of_teeth,
	pitch_radius,
	root_radius,
	base_radius,
	outer_radius,
	half_thick_angle,
	involute_facets)
{
	union()
	{
		rotate (half_thick_angle) circle ($fn=number_of_teeth*2, r=root_radius);

		for (i = [1:number_of_teeth])
		{
			rotate ([0,0,i*360/number_of_teeth])
			{
				involute_gear_tooth (
					pitch_radius = pitch_radius,
					root_radius = root_radius,
					base_radius = base_radius,
					outer_radius = outer_radius,
					half_thick_angle = half_thick_angle,
					involute_facets=involute_facets);
			}
		}
	}
}

module involute_gear_tooth (
	pitch_radius,
	root_radius,
	base_radius,
	outer_radius,
	half_thick_angle,
	involute_facets)
{
	min_radius = max (base_radius,root_radius);

	pitch_point = involute (base_radius, involute_intersect_angle (base_radius, pitch_radius));
	pitch_angle = atan2 (pitch_point[1], pitch_point[0]);
	centre_angle = pitch_angle + half_thick_angle;

	start_angle = involute_intersect_angle (base_radius, min_radius);
	stop_angle = involute_intersect_angle (base_radius, outer_radius);

	res=(involute_facets!=0)?involute_facets:($fn==0)?5:$fn/4;

	union ()
	{
		for (i=[1:res])
		assign (
			point1=involute (base_radius,start_angle+(stop_angle - start_angle)*(i-1)/res),
			point2=involute (base_radius,start_angle+(stop_angle - start_angle)*i/res))
		{
			assign (
				side1_point1=rotate_point (centre_angle, point1),
				side1_point2=rotate_point (centre_angle, point2),
				side2_point1=mirror_point (rotate_point (centre_angle, point1)),
				side2_point2=mirror_point (rotate_point (centre_angle, point2)))
			{
				polygon (
					points=[[0,0],side1_point1,side1_point2,side2_point2,side2_point1],
					paths=[[0,1,2,3,4,0]]);
			}
		}
	}
}

// Mathematical Functions
//===============

// Finds the angle of the involute about the base radius at the given distance (radius) from it's center.
//source: http://www.mathhelpforum.com/math-help/geometry/136011-circle-involute-solving-y-any-given-x.html

function involute_intersect_angle (base_radius, radius) = sqrt (pow (radius/base_radius, 2) - 1) * 180 / pi;

// Calculate the involute position for a given base radius and involute angle.

function rotated_involute (rotate, base_radius, involute_angle) =
[
	cos (rotate) * involute (base_radius, involute_angle)[0] + sin (rotate) * involute (base_radius, involute_angle)[1],
	cos (rotate) * involute (base_radius, involute_angle)[1] - sin (rotate) * involute (base_radius, involute_angle)[0]
];

function mirror_point (coord) =
[
	coord[0],
	-coord[1]
];

function rotate_point (rotate, coord) =
[
	cos (rotate) * coord[0] + sin (rotate) * coord[1],
	cos (rotate) * coord[1] - sin (rotate) * coord[0]
];

function involute (base_radius, involute_angle) =
[
	base_radius*(cos (involute_angle) + involute_angle*pi/180*sin (involute_angle)),
	base_radius*(sin (involute_angle) - involute_angle*pi/180*cos (involute_angle))
];


// Test Cases
//===============

module test_gears()
{
	translate([17,-15])
	{
		gear (number_of_teeth=17,
			circular_pitch=500,
			circles=8);

		rotate ([0,0,360*4/17])
		translate ([39.088888,0,0])
		{
			gear (number_of_teeth=11,
				circular_pitch=500,
				hub_diameter=0,
				rim_width=65);
			translate ([0,0,8])
			{
				gear (number_of_teeth=6,
					circular_pitch=300,
					hub_diameter=0,
					rim_width=5,
					rim_thickness=6,
					pressure_angle=31);
				rotate ([0,0,360*5/6])
				translate ([22.5,0,1])
				gear (number_of_teeth=21,
					circular_pitch=300,
					bore_diameter=2,
					hub_diameter=4,
					rim_width=1,
					hub_thickness=4,
					rim_thickness=4,
					gear_thickness=3,
					pressure_angle=31);
			}
		}

		translate ([-61.1111111,0,0])
		{
			gear (number_of_teeth=27,
				circular_pitch=500,
				circles=5,
				hub_diameter=2*8.88888889);

			translate ([0,0,10])
			{
				gear (
					number_of_teeth=14,
					circular_pitch=200,
					pressure_angle=5,
					clearance = 0.2,
					gear_thickness = 10,
					rim_thickness = 10,
					rim_width = 15,
					bore_diameter=5,
					circles=0);
				translate ([13.8888888,0,1])
				gear (
					number_of_teeth=11,
					circular_pitch=200,
					pressure_angle=5,
					clearance = 0.2,
					gear_thickness = 10,
					rim_thickness = 10,
					rim_width = 15,
					hub_thickness = 20,
					hub_diameter=2*7.222222,
					bore_diameter=5,
					circles=0);
			}
		}

		rotate ([0,0,360*-5/17])
		translate ([44.444444444,0,0])
		gear (number_of_teeth=15,
			circular_pitch=500,
			hub_diameter=10,
			rim_width=5,
			rim_thickness=5,
			gear_thickness=4,
			hub_thickness=6,
			circles=9);

		rotate ([0,0,360*-1/17])
		translate ([30.5555555,0,-1])
		gear (number_of_teeth=5,
			circular_pitch=500,
			hub_diameter=0,
			rim_width=5,
			rim_thickness=10);
	}
}

module meshing_double_helix ()
{
	test_double_helix_gear ();

	mirror ([0,1,0])
	translate ([58.33333333,0,0])
	test_double_helix_gear (teeth=13,circles=6);
}

module test_double_helix_gear (
	teeth=17,
	circles=8)
{
	//double helical gear
	{
		twist=200;
		height=20;
		pressure_angle=30;

		gear (number_of_teeth=teeth,
			circular_pitch=700,
			pressure_angle=pressure_angle,
			clearance = 0.2,
			gear_thickness = height/2*0.5,
			rim_thickness = height/2,
			rim_width = 5,
			hub_thickness = height/2*1.2,
			hub_diameter=15,
			bore_diameter=5,
			circles=circles,
			twist=twist/teeth);
		mirror([0,0,1])
		gear (number_of_teeth=teeth,
			circular_pitch=700,
			pressure_angle=pressure_angle,
			clearance = 0.2,
			gear_thickness = height/2,
			rim_thickness = height/2,
			rim_width = 5,
			hub_thickness = height/2,
			hub_diameter=15,
			bore_diameter=5,
			circles=circles,
			twist=twist/teeth);
	}
}

module test_backlash ()
{
	backlash = 2;
	teeth = 15;

	translate ([-29.166666,0,0])
	{
		translate ([58.3333333,0,0])
		rotate ([0,0,-360/teeth/4])
		gear (
			number_of_teeth = teeth,
			circular_pitch=700,
			gear_thickness = 12,
			rim_thickness = 15,
			rim_width = 5,
			hub_thickness = 17,
			hub_diameter=15,
			bore_diameter=5,
			backlash = 2,
			circles=8);

		rotate ([0,0,360/teeth/4])
		gear (
			number_of_teeth = teeth,
			circular_pitch=700,
			gear_thickness = 12,
			rim_thickness = 15,
			rim_width = 5,
			hub_thickness = 17,
			hub_diameter=15,
			bore_diameter=5,
			backlash = 2,
			circles=8);
	}

	color([0,0,128,0.5])
	translate([0,0,-5])
	cylinder ($fn=20,r=backlash / 4,h=25);
}
